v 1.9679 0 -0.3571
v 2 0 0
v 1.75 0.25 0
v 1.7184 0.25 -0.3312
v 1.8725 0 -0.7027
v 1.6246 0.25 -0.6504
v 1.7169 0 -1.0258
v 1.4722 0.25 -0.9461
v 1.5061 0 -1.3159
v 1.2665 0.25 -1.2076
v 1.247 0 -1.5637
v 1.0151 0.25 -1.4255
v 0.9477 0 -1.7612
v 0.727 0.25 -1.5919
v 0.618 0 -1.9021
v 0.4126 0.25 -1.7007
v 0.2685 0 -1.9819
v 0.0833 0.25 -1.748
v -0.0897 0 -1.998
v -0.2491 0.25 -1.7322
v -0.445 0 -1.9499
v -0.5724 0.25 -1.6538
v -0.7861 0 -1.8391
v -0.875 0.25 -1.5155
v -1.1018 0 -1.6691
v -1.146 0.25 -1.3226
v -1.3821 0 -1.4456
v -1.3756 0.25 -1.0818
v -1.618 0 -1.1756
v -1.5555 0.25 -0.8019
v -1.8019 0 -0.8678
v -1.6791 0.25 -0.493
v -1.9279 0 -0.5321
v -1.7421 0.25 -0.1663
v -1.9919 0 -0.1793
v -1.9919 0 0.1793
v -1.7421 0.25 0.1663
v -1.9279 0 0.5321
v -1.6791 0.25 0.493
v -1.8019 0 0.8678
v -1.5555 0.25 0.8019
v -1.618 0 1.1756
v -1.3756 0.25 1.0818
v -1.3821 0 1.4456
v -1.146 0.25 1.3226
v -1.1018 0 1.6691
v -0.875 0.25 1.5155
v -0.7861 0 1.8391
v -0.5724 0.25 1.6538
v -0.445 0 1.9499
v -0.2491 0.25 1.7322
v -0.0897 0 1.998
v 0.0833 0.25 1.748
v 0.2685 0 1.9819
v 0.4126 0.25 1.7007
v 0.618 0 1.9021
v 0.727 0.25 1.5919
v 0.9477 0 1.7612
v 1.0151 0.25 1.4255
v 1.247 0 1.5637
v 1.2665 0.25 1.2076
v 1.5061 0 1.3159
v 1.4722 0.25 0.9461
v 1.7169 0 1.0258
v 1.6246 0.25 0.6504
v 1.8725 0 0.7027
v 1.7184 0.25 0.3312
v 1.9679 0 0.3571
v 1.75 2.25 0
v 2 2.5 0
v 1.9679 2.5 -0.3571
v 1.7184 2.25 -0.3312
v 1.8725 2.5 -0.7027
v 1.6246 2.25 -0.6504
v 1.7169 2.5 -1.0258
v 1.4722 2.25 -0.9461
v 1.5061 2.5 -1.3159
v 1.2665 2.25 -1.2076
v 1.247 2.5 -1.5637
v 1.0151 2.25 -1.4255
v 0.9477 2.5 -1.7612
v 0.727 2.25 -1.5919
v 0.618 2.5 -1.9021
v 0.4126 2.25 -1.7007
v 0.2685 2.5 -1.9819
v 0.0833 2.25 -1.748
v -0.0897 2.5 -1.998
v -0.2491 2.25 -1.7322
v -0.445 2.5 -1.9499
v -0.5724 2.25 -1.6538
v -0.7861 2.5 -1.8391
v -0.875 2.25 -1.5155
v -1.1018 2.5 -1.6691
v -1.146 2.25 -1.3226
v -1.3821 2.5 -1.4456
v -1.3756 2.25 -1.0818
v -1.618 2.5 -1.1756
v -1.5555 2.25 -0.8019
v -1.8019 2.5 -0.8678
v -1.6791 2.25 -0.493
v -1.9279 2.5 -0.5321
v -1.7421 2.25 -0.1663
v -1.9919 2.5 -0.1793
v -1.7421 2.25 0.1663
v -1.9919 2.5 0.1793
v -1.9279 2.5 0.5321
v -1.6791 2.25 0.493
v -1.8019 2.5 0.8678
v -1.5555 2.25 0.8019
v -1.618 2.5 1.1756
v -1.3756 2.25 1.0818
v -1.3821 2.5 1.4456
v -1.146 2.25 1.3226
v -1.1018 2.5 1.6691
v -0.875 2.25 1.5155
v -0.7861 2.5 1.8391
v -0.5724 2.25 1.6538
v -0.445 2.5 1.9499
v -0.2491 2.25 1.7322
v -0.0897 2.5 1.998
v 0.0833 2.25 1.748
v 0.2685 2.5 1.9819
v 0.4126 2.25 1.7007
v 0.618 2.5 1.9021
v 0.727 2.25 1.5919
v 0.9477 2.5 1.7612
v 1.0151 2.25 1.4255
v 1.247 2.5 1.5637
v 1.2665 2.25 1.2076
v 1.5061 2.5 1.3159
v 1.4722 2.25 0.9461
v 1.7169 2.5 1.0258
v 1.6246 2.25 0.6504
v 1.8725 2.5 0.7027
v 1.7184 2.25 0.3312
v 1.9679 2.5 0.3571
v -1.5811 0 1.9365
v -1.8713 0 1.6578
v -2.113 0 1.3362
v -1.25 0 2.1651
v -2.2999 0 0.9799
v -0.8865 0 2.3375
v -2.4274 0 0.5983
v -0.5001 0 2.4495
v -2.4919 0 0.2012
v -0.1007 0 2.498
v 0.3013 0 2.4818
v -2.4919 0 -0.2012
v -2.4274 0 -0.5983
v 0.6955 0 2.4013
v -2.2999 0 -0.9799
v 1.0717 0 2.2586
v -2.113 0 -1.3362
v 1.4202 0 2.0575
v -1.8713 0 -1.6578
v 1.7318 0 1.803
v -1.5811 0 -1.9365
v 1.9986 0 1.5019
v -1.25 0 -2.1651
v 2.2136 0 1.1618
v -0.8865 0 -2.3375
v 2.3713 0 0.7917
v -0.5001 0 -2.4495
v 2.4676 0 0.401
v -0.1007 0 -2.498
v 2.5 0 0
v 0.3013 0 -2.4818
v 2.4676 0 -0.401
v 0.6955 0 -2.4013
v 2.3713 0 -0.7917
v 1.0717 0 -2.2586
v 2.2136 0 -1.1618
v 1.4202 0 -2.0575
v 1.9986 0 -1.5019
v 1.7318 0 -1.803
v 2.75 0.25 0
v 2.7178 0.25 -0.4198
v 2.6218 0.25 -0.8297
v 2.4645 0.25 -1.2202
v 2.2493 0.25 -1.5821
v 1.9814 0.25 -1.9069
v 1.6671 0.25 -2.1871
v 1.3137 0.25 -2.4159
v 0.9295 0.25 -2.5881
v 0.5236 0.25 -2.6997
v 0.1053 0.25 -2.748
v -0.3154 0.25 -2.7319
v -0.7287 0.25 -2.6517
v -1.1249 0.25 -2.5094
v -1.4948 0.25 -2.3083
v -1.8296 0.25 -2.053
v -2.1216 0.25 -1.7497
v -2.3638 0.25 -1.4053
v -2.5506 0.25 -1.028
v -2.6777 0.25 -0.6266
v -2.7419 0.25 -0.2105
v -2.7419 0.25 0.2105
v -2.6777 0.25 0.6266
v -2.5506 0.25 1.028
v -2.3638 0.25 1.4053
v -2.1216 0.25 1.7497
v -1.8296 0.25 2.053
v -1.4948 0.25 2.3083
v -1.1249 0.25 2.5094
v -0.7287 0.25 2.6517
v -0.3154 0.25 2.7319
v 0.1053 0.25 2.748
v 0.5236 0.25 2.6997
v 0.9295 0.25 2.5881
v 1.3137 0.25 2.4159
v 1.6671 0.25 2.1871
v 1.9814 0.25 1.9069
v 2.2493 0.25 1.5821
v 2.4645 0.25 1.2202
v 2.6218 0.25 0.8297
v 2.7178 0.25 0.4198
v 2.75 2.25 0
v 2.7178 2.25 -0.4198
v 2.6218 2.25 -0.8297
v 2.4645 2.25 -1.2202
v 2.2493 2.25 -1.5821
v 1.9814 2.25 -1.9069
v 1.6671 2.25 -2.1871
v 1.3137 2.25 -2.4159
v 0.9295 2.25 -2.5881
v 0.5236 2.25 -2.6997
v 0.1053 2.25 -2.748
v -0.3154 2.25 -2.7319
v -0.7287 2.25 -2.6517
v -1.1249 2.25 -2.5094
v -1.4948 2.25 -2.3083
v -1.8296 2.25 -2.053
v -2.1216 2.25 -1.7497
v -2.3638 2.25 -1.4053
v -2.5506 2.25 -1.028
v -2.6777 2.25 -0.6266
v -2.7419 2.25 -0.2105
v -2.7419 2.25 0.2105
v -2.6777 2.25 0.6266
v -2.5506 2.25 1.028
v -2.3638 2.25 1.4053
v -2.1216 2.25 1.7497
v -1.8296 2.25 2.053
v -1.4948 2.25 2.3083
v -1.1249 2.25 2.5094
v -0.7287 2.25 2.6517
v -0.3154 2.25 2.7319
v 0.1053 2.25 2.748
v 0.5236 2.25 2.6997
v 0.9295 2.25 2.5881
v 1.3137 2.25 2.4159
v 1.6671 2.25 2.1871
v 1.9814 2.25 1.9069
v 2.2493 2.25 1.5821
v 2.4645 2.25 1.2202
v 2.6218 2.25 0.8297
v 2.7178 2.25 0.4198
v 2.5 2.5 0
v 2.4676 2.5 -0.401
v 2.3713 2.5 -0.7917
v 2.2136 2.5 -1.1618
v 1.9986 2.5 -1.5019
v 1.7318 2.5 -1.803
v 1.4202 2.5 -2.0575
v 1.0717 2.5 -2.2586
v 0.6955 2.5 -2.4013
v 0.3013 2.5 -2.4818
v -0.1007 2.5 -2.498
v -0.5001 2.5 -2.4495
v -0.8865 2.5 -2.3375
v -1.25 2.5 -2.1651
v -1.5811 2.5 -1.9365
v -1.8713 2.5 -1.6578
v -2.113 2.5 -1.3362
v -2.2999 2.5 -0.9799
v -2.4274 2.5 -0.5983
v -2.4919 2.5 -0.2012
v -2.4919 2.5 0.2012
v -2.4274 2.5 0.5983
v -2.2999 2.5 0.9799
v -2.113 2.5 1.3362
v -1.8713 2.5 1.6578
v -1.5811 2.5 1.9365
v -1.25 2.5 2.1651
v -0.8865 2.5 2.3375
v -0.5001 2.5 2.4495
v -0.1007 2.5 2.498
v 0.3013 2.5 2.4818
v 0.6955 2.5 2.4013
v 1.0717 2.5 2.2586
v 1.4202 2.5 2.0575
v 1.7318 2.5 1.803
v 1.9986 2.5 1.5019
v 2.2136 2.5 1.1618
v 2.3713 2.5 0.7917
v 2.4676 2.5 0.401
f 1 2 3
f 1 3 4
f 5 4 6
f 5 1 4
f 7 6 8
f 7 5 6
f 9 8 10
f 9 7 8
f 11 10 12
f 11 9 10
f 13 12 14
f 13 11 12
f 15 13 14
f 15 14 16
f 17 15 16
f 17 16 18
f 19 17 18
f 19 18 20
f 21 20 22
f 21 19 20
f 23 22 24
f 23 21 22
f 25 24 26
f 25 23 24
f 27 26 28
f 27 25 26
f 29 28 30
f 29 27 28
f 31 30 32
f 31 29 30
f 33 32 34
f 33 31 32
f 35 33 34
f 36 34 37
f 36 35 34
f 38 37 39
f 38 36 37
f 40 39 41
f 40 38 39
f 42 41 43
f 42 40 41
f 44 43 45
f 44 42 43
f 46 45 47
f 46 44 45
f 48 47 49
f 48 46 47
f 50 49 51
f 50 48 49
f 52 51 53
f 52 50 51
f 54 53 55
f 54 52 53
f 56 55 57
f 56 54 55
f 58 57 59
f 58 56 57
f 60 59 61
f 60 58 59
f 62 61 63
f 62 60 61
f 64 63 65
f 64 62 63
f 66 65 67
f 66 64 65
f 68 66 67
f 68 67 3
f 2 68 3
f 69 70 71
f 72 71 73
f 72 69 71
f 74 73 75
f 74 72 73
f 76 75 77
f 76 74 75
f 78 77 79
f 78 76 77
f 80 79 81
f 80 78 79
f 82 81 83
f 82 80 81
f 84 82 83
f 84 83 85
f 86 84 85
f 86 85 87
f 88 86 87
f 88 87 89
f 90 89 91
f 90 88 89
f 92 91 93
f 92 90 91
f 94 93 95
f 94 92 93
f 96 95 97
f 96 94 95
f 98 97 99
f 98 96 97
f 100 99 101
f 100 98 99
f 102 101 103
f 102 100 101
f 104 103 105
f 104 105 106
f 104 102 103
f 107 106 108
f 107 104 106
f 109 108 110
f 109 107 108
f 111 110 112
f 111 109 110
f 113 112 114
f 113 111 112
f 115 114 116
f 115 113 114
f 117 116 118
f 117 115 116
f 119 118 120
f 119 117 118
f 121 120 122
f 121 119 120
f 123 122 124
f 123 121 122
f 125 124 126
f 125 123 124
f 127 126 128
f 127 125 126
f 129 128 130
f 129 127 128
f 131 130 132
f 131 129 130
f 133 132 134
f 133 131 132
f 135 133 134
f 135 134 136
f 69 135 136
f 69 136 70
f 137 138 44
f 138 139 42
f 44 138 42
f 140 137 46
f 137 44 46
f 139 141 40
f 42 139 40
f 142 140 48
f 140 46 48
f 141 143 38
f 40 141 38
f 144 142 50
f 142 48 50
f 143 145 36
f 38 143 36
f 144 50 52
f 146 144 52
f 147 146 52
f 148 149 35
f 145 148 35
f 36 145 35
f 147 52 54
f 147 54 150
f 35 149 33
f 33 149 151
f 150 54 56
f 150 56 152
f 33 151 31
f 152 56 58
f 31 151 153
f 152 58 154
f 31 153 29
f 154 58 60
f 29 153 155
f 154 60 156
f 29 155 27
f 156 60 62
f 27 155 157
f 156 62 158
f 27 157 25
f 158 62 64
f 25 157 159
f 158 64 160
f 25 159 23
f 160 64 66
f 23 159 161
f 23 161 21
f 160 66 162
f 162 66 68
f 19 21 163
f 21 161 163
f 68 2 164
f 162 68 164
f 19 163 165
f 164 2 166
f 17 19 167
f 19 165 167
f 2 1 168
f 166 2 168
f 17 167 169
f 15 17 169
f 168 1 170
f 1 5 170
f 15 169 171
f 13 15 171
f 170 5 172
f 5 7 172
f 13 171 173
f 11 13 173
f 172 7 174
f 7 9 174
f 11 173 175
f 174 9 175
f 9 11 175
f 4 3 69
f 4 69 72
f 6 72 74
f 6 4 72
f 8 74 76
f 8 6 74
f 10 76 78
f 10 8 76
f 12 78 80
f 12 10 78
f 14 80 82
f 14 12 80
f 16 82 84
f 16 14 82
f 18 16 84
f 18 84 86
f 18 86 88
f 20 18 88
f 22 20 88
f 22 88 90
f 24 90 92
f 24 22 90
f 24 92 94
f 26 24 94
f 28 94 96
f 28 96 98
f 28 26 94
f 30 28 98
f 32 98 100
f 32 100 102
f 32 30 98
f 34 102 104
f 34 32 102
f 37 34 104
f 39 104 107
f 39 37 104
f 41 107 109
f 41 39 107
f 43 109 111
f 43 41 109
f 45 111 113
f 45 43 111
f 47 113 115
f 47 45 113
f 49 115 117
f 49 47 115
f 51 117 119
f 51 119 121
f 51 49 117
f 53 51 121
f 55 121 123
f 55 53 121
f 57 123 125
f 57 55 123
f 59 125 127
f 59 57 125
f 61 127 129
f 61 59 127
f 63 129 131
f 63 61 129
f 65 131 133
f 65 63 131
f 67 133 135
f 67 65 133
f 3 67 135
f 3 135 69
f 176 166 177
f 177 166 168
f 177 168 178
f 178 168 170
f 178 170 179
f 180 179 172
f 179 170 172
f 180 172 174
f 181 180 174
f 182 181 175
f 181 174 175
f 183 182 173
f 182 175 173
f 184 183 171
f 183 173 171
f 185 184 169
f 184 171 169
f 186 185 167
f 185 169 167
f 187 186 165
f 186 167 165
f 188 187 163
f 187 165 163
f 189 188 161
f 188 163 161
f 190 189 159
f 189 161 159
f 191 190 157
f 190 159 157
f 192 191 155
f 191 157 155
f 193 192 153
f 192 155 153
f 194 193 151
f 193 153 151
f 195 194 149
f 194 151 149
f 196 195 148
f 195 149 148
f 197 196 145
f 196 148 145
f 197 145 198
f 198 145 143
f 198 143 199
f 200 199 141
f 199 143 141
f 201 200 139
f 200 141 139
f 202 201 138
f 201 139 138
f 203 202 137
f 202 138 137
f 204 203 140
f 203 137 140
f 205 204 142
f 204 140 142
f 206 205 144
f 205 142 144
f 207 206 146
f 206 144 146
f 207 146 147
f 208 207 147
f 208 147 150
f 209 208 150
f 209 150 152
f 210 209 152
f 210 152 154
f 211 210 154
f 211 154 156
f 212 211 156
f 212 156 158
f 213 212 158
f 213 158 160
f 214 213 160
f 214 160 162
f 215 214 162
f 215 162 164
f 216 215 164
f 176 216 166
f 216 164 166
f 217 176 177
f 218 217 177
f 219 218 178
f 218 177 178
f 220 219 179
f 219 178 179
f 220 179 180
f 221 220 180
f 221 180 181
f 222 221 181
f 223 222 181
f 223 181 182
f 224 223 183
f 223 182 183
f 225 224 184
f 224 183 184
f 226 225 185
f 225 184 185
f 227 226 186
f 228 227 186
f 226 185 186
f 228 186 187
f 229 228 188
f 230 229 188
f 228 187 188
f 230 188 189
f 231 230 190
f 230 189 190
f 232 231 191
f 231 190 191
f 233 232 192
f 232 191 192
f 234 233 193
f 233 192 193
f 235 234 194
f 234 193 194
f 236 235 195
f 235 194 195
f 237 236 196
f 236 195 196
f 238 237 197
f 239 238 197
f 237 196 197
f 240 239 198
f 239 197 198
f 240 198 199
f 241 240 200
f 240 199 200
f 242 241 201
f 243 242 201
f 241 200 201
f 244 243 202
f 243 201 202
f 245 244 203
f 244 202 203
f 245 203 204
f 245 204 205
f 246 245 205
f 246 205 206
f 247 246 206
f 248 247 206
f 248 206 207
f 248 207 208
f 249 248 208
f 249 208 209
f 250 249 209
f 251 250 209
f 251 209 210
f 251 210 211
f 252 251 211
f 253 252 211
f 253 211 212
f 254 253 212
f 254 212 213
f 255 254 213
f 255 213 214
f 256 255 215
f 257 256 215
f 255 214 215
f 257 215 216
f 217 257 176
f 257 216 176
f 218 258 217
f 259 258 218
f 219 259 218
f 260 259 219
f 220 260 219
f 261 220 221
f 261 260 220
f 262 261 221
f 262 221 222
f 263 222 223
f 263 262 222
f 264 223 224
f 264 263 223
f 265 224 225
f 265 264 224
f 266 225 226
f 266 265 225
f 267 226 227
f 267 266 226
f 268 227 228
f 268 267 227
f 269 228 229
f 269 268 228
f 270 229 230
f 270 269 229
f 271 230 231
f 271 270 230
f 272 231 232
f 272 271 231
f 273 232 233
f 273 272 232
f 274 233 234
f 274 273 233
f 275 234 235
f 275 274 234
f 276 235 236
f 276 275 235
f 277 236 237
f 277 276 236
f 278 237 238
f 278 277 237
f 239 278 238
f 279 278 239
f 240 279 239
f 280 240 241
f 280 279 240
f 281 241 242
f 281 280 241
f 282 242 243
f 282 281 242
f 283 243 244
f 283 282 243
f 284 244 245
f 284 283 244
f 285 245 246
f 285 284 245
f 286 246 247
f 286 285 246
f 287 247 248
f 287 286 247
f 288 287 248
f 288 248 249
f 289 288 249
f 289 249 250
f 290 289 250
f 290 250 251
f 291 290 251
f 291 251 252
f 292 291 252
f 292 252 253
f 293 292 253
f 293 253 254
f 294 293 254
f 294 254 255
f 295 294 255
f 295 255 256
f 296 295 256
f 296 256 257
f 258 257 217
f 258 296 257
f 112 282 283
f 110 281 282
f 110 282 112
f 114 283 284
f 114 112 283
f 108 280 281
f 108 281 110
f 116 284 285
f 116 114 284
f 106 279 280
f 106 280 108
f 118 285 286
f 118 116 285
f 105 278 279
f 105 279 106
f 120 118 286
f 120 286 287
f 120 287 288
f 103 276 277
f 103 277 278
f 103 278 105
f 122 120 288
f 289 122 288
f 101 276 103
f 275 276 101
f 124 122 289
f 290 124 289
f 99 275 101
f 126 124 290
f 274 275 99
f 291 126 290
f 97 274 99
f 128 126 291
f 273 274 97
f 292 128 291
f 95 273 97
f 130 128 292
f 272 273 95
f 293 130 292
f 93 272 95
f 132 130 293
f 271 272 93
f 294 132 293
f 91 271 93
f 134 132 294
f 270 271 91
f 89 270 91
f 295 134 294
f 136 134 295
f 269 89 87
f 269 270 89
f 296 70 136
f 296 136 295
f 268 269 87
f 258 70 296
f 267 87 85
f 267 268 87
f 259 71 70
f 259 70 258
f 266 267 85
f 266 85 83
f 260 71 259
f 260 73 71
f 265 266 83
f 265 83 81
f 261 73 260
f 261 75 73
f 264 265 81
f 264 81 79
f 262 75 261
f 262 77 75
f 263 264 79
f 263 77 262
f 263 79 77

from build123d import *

# Parameters (mm, degrees)
SKETCH2_R           = 2.75
SKETCH2_R_2         = 1.75
BOSS_EXTRUDE1_DEPTH = 2.5
CHAMFER1_SIZE       = 0.25
CHAMFER2_SIZE       = 0.25
CHAMFER3_SIZE       = 0.25
CHAMFER4_SIZE       = 0.25


with BuildPart() as part:
    # Sketch2 → Boss-Extrude1 (new body)
    with BuildSketch(Plane(origin=(0, 0, 0), x_dir=(1, 0, 0), z_dir=(0, 1, 0))):
        Circle(SKETCH2_R)
        Circle(SKETCH2_R_2, mode=Mode.SUBTRACT)
    extrude(amount=BOSS_EXTRUDE1_DEPTH)

    # Chamfer1
    chamfer1_edges = [part.edges().sort_by_distance(p)[0] for p in [
        (-2.75, 2.5, 0),
    ]]
    chamfer(chamfer1_edges, length=CHAMFER1_SIZE)

    # Chamfer2
    chamfer2_edges = [part.edges().sort_by_distance(p)[0] for p in [
        (-2.75, 0, 0),
    ]]
    chamfer(chamfer2_edges, length=CHAMFER2_SIZE)

    # Chamfer3
    chamfer3_edges = [part.edges().sort_by_distance(p)[0] for p in [
        (-1.75, 2.5, 0),
    ]]
    chamfer(chamfer3_edges, length=CHAMFER3_SIZE)

    # Chamfer4
    chamfer4_edges = [part.edges().sort_by_distance(p)[0] for p in [
        (-1.75, 0, 0),
    ]]
    chamfer(chamfer4_edges, length=CHAMFER4_SIZE)


solid = part.part
